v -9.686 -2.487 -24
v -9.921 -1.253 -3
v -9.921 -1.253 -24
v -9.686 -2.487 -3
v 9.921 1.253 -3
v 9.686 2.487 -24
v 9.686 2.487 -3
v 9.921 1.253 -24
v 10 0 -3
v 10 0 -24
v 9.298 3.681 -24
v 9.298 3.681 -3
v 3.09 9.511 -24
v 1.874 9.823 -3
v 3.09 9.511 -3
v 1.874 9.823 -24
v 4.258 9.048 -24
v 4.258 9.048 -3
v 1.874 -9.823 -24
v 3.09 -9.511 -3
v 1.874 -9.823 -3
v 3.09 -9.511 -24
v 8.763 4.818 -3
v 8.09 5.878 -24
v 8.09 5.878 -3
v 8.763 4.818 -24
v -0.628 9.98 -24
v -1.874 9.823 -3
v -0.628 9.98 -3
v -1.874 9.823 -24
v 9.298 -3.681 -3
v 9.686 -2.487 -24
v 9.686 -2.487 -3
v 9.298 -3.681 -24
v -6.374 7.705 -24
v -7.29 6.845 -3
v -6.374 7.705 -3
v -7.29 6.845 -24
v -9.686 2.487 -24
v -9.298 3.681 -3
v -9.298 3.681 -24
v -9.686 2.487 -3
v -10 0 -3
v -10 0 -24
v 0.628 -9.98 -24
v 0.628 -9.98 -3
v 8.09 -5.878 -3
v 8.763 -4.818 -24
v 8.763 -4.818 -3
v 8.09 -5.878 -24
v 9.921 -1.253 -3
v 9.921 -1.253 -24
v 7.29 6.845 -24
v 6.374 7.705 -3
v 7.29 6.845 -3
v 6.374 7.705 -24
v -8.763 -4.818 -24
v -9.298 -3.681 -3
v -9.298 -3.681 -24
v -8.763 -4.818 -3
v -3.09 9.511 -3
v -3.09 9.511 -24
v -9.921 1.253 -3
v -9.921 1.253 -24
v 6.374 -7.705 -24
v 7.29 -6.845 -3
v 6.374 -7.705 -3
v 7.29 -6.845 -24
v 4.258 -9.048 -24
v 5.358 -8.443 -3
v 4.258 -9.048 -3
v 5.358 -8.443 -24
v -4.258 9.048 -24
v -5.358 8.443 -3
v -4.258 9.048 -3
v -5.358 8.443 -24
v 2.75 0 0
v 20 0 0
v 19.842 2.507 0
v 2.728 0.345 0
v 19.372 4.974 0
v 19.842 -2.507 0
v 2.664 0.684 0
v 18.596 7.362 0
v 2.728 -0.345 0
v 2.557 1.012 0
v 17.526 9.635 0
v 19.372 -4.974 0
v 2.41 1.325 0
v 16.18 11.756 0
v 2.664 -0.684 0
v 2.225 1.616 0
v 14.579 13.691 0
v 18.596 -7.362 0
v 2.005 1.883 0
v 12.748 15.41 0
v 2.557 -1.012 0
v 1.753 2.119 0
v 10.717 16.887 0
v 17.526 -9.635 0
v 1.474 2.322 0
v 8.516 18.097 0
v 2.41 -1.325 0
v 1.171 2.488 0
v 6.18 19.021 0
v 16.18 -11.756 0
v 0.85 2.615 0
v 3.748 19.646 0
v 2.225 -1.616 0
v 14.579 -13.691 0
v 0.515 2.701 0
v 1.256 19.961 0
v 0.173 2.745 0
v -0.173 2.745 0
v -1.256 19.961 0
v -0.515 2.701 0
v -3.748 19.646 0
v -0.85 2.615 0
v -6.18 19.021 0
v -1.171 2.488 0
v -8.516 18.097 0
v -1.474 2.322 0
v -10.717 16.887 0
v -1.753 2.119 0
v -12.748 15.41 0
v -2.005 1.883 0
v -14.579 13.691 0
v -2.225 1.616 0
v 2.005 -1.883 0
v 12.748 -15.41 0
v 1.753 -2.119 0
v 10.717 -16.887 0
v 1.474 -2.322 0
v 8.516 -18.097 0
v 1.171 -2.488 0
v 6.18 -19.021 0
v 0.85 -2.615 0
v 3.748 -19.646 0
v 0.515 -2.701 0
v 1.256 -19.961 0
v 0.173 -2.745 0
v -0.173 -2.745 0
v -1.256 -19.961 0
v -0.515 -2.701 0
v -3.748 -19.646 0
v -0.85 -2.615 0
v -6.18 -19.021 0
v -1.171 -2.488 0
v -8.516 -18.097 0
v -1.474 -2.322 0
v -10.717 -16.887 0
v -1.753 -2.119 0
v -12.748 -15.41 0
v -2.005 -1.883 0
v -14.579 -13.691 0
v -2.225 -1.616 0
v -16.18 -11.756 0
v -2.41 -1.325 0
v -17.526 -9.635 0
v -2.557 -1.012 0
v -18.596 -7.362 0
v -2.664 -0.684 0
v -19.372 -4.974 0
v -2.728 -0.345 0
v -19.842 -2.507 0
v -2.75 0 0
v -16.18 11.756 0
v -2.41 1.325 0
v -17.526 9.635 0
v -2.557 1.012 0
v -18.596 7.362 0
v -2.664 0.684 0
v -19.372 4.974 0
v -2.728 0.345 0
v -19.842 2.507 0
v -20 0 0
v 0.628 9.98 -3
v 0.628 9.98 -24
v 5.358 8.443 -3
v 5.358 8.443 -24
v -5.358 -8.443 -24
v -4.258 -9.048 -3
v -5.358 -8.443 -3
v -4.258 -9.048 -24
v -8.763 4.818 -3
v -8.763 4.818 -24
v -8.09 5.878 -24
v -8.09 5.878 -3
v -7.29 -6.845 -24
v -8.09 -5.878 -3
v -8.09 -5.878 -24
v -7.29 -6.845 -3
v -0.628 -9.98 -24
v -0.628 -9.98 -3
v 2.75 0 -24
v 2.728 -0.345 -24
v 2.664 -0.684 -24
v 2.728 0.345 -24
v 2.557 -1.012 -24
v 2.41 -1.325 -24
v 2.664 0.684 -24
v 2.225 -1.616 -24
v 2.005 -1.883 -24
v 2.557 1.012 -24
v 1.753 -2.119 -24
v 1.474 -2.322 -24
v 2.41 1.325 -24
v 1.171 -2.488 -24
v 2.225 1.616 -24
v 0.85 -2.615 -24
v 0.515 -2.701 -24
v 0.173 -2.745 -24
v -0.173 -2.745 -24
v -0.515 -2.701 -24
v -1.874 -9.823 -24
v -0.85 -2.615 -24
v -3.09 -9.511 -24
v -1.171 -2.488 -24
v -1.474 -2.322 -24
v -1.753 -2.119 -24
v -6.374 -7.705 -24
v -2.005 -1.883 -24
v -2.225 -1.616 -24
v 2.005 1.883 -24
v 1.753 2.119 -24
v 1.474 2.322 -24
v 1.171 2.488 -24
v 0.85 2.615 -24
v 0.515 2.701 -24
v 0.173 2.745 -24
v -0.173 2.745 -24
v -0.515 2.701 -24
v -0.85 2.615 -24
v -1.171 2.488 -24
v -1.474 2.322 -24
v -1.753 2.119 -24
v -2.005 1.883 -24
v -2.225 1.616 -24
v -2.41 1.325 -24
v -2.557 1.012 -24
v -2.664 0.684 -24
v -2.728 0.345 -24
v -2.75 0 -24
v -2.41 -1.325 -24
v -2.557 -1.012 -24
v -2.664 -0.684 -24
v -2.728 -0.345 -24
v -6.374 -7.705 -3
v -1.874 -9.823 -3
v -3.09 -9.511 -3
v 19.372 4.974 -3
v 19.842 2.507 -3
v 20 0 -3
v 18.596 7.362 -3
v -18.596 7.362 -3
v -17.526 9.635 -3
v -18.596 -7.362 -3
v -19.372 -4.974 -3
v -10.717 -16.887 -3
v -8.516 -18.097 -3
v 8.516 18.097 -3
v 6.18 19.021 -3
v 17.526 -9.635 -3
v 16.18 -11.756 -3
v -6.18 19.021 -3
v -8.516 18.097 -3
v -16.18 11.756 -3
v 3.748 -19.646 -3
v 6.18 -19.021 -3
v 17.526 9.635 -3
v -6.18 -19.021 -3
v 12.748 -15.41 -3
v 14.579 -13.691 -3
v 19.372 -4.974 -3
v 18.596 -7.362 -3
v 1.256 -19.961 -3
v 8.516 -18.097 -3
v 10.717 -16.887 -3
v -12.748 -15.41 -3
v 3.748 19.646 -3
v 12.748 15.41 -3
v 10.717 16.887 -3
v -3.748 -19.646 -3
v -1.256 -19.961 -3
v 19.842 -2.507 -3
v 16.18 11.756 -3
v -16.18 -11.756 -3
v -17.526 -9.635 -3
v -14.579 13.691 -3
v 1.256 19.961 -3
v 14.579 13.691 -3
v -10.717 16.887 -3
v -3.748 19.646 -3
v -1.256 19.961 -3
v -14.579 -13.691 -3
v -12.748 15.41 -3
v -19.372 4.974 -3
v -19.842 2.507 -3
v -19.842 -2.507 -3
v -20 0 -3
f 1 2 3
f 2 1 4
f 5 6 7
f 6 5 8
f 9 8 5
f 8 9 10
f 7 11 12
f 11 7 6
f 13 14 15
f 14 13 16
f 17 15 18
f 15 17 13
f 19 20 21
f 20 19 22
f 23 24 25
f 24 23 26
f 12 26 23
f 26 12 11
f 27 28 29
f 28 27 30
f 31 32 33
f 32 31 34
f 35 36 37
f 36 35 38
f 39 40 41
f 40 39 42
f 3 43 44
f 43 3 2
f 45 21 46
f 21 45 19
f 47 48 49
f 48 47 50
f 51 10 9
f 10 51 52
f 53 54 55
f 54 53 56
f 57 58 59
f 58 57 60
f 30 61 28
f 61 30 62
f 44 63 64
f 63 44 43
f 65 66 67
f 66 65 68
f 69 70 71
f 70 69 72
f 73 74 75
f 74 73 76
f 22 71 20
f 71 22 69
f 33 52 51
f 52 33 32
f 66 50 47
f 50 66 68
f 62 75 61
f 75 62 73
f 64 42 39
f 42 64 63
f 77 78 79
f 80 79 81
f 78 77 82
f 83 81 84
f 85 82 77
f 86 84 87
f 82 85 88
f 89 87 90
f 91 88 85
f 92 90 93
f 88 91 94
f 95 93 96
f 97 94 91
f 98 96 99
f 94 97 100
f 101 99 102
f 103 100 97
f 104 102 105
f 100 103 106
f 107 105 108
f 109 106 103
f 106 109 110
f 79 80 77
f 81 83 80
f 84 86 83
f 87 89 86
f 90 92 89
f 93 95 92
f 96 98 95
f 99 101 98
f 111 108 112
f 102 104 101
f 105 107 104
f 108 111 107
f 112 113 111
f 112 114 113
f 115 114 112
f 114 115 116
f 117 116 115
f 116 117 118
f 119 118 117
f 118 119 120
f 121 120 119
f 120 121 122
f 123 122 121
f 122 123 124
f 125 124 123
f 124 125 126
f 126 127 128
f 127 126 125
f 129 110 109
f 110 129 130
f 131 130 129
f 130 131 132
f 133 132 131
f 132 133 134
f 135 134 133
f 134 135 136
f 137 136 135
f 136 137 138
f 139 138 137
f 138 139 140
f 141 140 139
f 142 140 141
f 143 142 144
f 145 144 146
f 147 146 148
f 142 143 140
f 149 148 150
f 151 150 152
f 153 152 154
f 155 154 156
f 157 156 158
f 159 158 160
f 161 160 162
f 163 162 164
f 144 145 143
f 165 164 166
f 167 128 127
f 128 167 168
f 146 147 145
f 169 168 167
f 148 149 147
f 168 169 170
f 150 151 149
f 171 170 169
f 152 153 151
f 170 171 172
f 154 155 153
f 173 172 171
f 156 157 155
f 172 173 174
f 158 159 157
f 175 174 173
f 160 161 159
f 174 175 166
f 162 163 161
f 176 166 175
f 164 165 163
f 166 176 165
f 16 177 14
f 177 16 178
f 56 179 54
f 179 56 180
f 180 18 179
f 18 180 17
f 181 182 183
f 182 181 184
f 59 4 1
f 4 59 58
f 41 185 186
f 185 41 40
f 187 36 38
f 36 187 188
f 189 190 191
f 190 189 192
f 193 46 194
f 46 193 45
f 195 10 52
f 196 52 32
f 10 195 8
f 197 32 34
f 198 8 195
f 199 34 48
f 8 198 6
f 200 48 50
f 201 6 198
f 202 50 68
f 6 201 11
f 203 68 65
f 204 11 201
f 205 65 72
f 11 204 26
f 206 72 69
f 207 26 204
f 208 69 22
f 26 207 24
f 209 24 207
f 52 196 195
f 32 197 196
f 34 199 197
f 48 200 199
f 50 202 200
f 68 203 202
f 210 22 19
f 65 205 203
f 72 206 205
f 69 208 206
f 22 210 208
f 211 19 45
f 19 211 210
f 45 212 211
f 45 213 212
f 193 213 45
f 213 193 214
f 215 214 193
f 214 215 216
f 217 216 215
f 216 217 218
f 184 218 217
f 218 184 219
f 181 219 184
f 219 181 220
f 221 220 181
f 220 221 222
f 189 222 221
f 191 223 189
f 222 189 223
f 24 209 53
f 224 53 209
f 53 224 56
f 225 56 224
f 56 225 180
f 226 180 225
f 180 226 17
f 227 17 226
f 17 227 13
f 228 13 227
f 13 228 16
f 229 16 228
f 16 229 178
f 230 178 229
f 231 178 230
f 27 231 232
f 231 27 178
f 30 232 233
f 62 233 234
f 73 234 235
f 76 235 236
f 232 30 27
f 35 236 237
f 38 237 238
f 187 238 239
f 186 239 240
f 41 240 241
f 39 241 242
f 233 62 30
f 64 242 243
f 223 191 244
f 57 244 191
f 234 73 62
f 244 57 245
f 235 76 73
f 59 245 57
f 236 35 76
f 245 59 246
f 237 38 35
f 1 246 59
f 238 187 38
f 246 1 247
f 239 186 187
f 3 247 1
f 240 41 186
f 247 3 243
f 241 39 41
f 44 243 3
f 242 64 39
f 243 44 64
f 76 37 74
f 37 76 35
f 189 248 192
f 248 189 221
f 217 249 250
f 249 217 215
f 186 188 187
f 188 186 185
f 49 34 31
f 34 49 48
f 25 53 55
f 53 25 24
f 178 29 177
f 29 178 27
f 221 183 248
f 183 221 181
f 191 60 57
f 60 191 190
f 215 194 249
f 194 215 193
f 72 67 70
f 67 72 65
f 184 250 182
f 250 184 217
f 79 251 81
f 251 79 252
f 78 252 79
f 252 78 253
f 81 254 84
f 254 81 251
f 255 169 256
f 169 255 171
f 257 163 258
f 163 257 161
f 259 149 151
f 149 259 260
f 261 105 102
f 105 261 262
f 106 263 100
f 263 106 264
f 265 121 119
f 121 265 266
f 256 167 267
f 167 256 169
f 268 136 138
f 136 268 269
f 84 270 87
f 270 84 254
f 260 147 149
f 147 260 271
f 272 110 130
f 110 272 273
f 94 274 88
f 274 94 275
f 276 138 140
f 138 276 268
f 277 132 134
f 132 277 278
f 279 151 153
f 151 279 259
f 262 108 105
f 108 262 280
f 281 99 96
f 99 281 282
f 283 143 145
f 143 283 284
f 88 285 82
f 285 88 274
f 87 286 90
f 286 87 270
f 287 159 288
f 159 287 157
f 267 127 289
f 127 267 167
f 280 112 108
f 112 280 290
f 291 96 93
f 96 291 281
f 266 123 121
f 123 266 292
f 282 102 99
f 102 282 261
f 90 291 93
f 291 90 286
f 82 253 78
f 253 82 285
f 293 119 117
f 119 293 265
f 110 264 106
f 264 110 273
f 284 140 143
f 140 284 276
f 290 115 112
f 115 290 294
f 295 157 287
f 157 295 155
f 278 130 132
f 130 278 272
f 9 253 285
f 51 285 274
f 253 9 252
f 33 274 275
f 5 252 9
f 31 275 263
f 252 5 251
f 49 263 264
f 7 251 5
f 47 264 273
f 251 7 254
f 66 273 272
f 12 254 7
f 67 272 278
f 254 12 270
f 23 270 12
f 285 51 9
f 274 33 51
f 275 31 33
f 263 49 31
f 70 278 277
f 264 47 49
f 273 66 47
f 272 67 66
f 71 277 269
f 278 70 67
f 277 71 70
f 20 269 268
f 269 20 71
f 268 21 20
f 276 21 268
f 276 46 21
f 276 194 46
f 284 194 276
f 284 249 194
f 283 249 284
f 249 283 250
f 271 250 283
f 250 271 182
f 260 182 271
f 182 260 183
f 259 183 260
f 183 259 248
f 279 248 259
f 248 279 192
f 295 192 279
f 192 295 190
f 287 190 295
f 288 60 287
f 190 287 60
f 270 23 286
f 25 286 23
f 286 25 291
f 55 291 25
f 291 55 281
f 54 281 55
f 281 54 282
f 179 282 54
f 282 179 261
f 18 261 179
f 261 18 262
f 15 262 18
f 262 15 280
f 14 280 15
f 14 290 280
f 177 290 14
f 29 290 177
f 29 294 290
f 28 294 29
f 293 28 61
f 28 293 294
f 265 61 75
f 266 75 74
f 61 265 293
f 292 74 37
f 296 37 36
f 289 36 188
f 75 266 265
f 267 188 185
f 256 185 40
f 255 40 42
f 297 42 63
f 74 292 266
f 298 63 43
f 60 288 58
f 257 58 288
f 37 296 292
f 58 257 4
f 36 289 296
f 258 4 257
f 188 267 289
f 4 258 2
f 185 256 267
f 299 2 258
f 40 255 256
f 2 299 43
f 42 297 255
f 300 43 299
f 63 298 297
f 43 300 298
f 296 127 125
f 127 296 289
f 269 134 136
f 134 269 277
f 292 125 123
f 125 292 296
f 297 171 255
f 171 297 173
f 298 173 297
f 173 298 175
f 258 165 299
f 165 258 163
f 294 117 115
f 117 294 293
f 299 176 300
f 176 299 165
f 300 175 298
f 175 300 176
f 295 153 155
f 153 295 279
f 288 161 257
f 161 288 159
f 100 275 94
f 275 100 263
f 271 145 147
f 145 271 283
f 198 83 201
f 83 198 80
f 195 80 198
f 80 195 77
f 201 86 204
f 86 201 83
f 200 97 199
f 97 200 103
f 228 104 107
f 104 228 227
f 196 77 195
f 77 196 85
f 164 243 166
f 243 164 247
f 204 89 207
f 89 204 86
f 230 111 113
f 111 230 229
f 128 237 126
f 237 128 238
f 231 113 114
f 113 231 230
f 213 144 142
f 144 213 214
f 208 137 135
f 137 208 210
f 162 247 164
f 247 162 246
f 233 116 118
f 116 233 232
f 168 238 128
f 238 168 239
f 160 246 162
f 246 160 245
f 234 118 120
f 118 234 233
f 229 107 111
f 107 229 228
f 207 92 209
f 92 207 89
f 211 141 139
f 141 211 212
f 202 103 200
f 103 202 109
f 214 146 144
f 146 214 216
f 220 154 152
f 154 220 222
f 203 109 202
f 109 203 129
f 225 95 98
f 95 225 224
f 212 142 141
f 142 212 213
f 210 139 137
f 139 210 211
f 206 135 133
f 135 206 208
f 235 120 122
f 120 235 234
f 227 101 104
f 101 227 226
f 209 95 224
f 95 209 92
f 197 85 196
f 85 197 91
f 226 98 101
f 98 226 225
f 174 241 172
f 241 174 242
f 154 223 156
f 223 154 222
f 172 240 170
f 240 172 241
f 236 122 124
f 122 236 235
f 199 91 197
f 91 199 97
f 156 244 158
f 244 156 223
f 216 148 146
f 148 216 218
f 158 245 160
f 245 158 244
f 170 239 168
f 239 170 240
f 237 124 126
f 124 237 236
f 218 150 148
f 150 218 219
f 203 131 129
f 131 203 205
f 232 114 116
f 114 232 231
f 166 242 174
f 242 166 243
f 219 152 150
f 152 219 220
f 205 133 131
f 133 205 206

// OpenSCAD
$fn = 50;


difference() {
	union() {
		translate(v = [0, 0, -24.0000000000]) {
			cylinder(h = 24, r = 10.0000000000);
		}
		translate(v = [0, 0, -3.0000000000]) {
			cylinder(h = 3, r = 20.0000000000);
		}
	}
	union() {
		#translate(v = [0, 0, -24]) {
			cylinder(h = 24, r = 2.7500000000);
		}
	}
}
